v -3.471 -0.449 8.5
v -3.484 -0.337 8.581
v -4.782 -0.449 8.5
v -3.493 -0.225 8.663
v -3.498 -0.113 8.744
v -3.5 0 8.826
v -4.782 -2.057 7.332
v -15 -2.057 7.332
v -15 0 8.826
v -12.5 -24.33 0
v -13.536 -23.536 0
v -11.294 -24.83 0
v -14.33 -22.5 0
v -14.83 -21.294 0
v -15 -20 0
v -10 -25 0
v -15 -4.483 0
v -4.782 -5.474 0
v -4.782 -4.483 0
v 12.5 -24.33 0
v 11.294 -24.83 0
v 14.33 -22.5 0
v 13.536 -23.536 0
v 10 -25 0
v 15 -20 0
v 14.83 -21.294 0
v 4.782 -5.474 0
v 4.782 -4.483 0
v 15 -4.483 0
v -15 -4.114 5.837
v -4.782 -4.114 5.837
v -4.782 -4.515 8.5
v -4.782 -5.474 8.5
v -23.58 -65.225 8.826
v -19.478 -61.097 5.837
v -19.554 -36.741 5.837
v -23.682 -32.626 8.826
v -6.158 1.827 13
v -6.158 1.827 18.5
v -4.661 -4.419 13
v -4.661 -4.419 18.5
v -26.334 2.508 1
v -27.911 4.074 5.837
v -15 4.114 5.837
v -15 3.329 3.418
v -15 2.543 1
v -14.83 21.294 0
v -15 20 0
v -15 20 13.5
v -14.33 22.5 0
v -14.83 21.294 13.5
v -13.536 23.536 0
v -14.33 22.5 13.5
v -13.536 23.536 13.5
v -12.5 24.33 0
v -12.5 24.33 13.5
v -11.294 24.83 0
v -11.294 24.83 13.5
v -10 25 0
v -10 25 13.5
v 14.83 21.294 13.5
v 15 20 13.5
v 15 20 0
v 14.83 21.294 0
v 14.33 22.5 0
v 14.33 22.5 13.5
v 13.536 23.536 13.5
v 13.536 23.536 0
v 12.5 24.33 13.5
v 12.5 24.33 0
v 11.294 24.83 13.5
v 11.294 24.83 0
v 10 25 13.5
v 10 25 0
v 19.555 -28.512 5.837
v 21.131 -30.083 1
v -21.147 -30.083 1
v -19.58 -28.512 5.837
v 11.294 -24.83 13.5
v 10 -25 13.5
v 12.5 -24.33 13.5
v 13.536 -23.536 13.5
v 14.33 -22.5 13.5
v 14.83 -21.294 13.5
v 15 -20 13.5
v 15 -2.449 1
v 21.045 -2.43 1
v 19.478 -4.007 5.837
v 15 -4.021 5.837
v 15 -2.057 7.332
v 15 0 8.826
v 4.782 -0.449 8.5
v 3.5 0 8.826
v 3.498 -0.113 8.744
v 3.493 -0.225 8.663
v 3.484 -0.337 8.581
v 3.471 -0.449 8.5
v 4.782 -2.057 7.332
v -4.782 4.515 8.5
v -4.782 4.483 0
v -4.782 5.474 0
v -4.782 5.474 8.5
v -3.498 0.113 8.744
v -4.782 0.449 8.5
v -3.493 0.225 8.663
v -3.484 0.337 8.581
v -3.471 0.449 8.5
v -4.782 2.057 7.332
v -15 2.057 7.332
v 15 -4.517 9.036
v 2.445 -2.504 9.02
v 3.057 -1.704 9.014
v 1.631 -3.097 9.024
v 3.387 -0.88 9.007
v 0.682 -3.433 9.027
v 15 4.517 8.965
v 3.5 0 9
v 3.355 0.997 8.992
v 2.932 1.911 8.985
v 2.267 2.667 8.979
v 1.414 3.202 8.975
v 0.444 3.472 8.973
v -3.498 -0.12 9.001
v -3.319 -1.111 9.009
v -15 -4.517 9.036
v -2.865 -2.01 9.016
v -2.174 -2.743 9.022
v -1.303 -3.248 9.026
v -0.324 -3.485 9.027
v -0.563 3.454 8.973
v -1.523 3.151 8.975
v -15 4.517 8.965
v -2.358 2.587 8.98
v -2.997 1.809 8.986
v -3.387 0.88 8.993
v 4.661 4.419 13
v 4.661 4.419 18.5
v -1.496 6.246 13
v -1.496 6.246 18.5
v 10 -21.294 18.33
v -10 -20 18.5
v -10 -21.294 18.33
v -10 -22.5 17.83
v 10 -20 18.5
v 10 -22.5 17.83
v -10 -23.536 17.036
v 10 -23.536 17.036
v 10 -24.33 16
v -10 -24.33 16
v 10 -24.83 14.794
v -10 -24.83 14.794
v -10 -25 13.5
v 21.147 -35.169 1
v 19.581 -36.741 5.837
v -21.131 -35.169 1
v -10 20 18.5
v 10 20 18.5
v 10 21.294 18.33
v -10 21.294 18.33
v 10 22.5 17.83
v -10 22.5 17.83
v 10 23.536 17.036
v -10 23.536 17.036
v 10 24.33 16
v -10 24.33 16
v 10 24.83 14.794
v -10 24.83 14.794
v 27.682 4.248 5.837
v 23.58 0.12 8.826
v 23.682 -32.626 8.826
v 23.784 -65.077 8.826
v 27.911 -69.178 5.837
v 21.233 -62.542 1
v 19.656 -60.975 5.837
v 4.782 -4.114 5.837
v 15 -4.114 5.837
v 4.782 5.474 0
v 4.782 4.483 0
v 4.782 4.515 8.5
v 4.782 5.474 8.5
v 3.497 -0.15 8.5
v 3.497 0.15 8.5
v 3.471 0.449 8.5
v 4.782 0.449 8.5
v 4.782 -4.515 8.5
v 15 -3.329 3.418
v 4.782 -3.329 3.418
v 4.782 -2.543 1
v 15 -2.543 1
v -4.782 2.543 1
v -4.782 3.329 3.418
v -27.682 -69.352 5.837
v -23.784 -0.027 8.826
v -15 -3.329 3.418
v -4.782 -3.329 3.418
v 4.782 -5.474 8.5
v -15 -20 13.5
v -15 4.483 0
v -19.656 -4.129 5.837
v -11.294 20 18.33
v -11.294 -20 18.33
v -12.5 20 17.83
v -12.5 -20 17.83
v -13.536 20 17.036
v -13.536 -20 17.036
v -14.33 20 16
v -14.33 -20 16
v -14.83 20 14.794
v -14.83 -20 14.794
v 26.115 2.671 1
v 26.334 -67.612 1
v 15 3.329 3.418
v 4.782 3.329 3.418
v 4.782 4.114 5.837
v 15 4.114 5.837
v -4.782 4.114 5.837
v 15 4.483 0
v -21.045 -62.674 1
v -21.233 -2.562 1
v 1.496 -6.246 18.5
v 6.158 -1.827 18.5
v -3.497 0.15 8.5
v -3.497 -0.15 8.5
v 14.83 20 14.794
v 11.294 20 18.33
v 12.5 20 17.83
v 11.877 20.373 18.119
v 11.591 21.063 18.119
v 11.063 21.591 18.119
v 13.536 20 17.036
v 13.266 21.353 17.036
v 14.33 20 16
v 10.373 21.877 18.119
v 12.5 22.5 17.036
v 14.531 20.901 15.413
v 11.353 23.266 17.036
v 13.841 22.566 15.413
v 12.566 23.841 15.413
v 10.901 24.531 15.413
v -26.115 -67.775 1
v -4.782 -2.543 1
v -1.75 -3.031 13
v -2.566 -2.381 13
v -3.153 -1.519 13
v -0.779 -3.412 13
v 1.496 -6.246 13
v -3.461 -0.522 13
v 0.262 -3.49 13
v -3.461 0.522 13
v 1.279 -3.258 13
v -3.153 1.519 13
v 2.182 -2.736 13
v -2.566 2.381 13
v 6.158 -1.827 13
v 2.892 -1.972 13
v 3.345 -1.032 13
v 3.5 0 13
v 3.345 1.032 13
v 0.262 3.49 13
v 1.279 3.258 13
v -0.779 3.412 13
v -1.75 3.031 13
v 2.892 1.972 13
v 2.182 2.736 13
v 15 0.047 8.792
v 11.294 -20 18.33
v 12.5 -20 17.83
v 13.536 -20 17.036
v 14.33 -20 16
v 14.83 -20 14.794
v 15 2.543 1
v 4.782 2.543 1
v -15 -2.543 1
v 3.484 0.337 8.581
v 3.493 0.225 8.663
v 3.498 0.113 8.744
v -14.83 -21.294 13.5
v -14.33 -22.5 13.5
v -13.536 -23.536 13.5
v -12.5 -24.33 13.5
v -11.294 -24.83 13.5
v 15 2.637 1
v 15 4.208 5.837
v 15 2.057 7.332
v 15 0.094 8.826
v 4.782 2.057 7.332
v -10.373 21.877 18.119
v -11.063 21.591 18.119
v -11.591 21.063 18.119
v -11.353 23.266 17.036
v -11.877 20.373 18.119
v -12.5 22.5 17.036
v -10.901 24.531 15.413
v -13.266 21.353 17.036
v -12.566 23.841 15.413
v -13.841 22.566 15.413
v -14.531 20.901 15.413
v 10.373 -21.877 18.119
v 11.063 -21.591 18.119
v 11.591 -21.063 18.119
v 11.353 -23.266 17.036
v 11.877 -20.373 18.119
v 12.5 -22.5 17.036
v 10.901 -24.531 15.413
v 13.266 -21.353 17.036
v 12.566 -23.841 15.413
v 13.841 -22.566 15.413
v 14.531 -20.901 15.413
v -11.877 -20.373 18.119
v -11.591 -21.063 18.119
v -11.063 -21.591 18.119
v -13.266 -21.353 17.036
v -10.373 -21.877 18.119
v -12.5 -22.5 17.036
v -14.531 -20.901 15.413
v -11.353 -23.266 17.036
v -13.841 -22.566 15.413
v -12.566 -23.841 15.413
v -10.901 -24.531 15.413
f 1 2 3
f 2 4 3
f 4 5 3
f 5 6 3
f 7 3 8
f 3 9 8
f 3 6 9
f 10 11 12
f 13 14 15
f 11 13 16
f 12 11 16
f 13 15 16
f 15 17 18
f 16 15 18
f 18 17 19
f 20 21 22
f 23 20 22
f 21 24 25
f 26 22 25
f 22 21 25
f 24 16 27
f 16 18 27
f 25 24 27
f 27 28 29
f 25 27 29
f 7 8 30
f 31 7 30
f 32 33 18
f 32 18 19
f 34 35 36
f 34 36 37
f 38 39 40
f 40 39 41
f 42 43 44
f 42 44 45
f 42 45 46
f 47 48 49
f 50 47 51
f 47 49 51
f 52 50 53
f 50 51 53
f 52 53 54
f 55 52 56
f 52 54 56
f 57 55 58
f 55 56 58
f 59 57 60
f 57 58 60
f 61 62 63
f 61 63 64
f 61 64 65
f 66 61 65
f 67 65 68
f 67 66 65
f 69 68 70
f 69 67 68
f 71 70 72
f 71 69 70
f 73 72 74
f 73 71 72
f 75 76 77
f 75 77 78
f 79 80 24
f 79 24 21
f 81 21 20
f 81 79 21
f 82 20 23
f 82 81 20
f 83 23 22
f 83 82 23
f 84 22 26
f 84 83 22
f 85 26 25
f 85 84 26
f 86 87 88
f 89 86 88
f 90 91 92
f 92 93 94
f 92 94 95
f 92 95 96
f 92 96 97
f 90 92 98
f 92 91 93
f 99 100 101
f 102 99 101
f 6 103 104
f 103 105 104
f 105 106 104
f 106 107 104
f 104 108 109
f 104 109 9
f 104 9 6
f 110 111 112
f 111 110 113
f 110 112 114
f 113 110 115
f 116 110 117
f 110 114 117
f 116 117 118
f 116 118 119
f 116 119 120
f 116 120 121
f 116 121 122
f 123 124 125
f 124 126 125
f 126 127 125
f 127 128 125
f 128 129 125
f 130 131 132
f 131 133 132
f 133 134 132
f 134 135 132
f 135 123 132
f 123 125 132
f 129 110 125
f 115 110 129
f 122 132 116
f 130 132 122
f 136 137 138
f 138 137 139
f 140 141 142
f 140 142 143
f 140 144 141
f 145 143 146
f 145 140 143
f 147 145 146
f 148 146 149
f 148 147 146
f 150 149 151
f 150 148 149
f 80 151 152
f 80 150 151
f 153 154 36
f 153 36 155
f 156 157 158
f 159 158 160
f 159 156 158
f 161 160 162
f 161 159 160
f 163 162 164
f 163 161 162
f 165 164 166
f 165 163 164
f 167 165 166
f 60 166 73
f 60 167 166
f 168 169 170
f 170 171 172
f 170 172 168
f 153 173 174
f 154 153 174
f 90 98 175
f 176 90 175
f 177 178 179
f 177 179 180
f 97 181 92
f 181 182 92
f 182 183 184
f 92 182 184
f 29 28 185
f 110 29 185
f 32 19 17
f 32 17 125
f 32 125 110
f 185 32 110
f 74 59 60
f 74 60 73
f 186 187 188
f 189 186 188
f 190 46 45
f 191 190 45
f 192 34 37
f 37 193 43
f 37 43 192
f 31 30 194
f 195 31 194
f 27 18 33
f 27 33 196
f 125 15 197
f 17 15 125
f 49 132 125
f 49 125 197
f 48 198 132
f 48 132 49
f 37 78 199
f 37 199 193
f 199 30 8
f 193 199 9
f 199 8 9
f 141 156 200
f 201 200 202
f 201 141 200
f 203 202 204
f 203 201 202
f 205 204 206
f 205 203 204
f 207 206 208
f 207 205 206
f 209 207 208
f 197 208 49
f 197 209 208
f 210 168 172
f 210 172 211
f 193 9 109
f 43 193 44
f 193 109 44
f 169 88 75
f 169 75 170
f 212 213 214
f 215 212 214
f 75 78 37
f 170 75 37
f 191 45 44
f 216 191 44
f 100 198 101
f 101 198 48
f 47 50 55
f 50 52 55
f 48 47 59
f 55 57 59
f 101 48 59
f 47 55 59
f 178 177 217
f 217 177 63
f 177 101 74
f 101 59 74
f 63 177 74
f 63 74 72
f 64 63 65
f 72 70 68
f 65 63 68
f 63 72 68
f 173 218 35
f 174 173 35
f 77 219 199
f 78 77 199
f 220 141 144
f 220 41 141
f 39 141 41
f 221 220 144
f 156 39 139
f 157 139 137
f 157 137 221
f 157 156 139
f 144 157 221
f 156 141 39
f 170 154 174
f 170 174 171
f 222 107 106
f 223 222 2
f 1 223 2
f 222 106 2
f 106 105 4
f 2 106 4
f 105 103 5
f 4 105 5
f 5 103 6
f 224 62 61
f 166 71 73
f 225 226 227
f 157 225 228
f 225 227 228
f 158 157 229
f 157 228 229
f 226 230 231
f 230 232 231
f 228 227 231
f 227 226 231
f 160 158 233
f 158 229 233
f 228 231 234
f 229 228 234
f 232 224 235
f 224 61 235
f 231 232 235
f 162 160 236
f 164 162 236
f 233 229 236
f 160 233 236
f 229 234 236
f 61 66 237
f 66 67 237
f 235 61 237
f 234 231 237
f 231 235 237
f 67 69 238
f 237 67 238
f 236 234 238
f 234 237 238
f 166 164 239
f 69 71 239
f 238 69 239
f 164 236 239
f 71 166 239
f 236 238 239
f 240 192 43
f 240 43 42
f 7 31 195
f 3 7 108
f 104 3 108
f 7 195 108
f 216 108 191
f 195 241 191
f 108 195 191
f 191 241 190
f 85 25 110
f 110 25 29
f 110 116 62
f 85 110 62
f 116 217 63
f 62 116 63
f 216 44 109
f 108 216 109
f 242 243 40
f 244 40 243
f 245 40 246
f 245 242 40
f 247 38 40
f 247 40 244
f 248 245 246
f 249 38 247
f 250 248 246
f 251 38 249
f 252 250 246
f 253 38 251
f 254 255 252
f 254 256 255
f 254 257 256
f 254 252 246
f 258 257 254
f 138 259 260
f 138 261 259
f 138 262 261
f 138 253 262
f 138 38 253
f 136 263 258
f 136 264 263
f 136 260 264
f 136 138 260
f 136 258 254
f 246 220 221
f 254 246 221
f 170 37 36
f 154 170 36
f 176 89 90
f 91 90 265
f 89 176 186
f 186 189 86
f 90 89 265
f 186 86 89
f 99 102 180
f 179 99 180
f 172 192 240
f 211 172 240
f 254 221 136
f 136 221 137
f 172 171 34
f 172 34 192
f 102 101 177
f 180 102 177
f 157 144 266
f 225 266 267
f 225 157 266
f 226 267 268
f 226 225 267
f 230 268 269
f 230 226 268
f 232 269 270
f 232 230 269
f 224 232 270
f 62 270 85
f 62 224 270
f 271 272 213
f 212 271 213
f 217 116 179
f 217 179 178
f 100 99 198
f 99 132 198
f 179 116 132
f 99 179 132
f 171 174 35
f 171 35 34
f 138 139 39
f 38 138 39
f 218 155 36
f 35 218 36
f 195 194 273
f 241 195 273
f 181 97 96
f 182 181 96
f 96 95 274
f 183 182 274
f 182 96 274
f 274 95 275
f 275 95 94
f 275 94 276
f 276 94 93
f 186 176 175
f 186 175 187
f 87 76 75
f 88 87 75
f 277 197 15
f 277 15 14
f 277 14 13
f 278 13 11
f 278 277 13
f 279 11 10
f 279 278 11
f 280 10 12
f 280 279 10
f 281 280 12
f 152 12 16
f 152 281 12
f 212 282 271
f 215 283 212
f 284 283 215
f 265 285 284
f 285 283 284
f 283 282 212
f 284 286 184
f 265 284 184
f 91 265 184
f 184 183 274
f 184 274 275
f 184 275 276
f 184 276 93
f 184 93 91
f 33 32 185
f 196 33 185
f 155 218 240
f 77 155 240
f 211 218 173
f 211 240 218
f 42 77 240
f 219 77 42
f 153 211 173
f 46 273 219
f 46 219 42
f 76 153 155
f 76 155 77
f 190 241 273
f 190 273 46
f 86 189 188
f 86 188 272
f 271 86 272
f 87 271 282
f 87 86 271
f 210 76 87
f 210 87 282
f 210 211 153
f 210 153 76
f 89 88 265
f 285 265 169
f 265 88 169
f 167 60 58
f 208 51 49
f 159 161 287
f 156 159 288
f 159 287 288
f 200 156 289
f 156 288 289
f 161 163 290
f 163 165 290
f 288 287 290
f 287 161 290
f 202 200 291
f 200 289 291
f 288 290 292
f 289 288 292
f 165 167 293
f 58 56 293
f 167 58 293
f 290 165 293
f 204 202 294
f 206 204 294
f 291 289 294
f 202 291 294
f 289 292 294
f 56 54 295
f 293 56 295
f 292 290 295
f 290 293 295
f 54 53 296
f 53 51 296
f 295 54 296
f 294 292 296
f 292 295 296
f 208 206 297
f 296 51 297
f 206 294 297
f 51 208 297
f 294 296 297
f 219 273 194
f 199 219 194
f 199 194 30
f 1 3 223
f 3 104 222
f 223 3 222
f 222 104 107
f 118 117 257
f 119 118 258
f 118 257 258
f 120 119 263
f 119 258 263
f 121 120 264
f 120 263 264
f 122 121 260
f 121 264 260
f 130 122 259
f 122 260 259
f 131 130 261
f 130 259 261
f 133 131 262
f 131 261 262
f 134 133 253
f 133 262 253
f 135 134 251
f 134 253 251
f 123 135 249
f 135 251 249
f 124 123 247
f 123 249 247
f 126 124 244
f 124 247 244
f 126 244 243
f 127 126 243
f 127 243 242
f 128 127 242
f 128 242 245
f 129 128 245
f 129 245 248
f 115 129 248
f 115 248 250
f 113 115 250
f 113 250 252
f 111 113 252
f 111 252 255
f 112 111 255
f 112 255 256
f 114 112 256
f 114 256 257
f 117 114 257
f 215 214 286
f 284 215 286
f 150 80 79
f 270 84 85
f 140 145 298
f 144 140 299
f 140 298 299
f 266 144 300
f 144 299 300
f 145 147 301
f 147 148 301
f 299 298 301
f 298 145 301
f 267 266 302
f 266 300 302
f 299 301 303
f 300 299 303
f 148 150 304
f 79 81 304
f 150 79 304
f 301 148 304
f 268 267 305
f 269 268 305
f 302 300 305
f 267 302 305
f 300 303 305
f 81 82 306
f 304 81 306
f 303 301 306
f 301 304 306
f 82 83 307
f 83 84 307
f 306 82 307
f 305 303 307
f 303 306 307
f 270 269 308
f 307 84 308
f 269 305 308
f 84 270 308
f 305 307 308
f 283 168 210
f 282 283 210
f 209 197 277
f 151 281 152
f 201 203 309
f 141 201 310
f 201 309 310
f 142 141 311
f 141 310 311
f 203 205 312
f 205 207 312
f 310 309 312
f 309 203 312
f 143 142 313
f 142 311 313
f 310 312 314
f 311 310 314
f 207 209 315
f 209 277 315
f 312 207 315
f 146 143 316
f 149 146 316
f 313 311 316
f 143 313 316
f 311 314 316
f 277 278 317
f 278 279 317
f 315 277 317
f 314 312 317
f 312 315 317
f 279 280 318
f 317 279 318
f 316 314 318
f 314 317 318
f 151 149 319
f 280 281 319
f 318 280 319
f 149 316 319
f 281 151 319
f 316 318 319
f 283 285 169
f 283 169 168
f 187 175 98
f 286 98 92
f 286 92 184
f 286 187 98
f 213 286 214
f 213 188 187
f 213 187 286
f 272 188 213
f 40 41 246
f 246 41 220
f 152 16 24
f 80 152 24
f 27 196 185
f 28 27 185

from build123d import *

# Parameters (mm, degrees)
F0_W           = 30
F0_H           = 50
F1_DEPTH       = 18.5
F2_R           = 5
F3_R           = 5
F5_DEPTH       = 5.5
F12_DEPTH      = 23.6822730496
F12_DEPTH_BACK = 23.6818105915
F13_R          = 3.5
F14_DEPTH      = 25
F16_DEPTH      = 30
F17_W          = 9.563500993
F17_H          = 10.9478700906
F18_DEPTH      = 8.5


with BuildPart() as f1:
    # F0 (on Top) → F1 (new body)
    with BuildSketch(Plane.XY):
        Rectangle(F0_W, F0_H)
    extrude(amount=F1_DEPTH)

    # F2
    f2_edges = [f1.edges().sort_by_distance(p)[0] for p in [
        (15, -25, 9.25),
        (-15, -25, 9.25),
        (-15, 25, 9.25),
        (15, 25, 9.25),
    ]]
    fillet(f2_edges, radius=F2_R)

    # F3
    f3_edges = [f1.edges().sort_by_distance(p)[0] for p in [
        (13.535534, -23.535534, 18.5),
    ]]
    fillet(f3_edges, radius=F3_R)

    # F4 (on face) → F5 (cut)
    with BuildSketch(Plane.XY.offset(18.5)):
        Polygon((4.6614175494, 4.418868041), (-1.4961432048, 6.2463400359), (-6.1575607542, 1.8274719949), (-4.6614175494, -4.418868041), (1.4961432048, -6.2463400359), (6.1575607542, -1.8274719949), align=None)
    extrude(amount=-F5_DEPTH, mode=Mode.SUBTRACT)

    # F10: sweep along a path in F8
    with BuildLine(Plane.XY.offset(4.5)) as f10_path:
        Line((-23.8112160869, 0), (23.60743863, 0.1480849019))
        Line((23.60743863, 0.1480849019), (23.8112160869, -65.104028894))
        Line((23.8112160869, -65.104028894), (-23.60743863, -65.2521137959))
        Line((-23.60743863, -65.2521137959), (-23.8112160869, 0))
    # F9 (on face) → F10 (sweep)
    with BuildSketch(Plane(origin=(-15, 0, 0), x_dir=(0, -1, 0), z_dir=(-1, 0, 0))):
        Polygon((-2.542898848, 1), (2.542898848, 1), (4.114496766, 5.8368810394), (0, 8.8262379212), (-4.114496766, 5.8368810394), align=None)
    sweep(path=f10_path.line, transition=Transition.RIGHT)

    # F11 (on Right) → F12 (join, two sides)
    with BuildSketch(Plane.YZ) as f12_sk:
        Polygon((-35.168955746, 1), (-30.0831580499, 1), (-28.5115601319, 5.8368810394), (-32.6260568979, 8.8262379212), (-36.740553664, 5.8368810394), align=None)
    extrude(amount=F12_DEPTH)
    extrude(f12_sk.sketch, amount=-F12_DEPTH_BACK)

    # F13 (on face) → F14 (cut)
    with BuildSketch(Plane.XY.offset(18.5)):
        Circle(F13_R)
    extrude(amount=-F14_DEPTH, mode=Mode.SUBTRACT)

    # F15 (on face) → F16 (cut)
    with BuildSketch(Plane(origin=(-15, 0, 0), x_dir=(0, -1, 0), z_dir=(-1, 0, 0))):
        Polygon((-4.516600949, 8.9647028955), (-4.4833300345, 0), (4.4833300345, 0), (4.5168639826, 9.0355761568), align=None)
        Polygon((0, 8.8262379212), (2.0572484125, 7.3315594589), (4.114496766, 5.8368810394), (3.3286978089, 3.4184405255), (2.542898848, 1), (0, 1), (-2.542898848, 1), (-3.328697754, 3.4184403566), (-4.114496766, 5.8368810394), (-2.0572484027, 7.331559466), align=None, mode=Mode.SUBTRACT)
    extrude(amount=-F16_DEPTH, mode=Mode.SUBTRACT)

    # F17 (on face) → F18 (cut)
    with BuildSketch(Plane.XY):
        Rectangle(F17_W, F17_H)
    extrude(amount=F18_DEPTH, mode=Mode.SUBTRACT)


solid = f1.part
